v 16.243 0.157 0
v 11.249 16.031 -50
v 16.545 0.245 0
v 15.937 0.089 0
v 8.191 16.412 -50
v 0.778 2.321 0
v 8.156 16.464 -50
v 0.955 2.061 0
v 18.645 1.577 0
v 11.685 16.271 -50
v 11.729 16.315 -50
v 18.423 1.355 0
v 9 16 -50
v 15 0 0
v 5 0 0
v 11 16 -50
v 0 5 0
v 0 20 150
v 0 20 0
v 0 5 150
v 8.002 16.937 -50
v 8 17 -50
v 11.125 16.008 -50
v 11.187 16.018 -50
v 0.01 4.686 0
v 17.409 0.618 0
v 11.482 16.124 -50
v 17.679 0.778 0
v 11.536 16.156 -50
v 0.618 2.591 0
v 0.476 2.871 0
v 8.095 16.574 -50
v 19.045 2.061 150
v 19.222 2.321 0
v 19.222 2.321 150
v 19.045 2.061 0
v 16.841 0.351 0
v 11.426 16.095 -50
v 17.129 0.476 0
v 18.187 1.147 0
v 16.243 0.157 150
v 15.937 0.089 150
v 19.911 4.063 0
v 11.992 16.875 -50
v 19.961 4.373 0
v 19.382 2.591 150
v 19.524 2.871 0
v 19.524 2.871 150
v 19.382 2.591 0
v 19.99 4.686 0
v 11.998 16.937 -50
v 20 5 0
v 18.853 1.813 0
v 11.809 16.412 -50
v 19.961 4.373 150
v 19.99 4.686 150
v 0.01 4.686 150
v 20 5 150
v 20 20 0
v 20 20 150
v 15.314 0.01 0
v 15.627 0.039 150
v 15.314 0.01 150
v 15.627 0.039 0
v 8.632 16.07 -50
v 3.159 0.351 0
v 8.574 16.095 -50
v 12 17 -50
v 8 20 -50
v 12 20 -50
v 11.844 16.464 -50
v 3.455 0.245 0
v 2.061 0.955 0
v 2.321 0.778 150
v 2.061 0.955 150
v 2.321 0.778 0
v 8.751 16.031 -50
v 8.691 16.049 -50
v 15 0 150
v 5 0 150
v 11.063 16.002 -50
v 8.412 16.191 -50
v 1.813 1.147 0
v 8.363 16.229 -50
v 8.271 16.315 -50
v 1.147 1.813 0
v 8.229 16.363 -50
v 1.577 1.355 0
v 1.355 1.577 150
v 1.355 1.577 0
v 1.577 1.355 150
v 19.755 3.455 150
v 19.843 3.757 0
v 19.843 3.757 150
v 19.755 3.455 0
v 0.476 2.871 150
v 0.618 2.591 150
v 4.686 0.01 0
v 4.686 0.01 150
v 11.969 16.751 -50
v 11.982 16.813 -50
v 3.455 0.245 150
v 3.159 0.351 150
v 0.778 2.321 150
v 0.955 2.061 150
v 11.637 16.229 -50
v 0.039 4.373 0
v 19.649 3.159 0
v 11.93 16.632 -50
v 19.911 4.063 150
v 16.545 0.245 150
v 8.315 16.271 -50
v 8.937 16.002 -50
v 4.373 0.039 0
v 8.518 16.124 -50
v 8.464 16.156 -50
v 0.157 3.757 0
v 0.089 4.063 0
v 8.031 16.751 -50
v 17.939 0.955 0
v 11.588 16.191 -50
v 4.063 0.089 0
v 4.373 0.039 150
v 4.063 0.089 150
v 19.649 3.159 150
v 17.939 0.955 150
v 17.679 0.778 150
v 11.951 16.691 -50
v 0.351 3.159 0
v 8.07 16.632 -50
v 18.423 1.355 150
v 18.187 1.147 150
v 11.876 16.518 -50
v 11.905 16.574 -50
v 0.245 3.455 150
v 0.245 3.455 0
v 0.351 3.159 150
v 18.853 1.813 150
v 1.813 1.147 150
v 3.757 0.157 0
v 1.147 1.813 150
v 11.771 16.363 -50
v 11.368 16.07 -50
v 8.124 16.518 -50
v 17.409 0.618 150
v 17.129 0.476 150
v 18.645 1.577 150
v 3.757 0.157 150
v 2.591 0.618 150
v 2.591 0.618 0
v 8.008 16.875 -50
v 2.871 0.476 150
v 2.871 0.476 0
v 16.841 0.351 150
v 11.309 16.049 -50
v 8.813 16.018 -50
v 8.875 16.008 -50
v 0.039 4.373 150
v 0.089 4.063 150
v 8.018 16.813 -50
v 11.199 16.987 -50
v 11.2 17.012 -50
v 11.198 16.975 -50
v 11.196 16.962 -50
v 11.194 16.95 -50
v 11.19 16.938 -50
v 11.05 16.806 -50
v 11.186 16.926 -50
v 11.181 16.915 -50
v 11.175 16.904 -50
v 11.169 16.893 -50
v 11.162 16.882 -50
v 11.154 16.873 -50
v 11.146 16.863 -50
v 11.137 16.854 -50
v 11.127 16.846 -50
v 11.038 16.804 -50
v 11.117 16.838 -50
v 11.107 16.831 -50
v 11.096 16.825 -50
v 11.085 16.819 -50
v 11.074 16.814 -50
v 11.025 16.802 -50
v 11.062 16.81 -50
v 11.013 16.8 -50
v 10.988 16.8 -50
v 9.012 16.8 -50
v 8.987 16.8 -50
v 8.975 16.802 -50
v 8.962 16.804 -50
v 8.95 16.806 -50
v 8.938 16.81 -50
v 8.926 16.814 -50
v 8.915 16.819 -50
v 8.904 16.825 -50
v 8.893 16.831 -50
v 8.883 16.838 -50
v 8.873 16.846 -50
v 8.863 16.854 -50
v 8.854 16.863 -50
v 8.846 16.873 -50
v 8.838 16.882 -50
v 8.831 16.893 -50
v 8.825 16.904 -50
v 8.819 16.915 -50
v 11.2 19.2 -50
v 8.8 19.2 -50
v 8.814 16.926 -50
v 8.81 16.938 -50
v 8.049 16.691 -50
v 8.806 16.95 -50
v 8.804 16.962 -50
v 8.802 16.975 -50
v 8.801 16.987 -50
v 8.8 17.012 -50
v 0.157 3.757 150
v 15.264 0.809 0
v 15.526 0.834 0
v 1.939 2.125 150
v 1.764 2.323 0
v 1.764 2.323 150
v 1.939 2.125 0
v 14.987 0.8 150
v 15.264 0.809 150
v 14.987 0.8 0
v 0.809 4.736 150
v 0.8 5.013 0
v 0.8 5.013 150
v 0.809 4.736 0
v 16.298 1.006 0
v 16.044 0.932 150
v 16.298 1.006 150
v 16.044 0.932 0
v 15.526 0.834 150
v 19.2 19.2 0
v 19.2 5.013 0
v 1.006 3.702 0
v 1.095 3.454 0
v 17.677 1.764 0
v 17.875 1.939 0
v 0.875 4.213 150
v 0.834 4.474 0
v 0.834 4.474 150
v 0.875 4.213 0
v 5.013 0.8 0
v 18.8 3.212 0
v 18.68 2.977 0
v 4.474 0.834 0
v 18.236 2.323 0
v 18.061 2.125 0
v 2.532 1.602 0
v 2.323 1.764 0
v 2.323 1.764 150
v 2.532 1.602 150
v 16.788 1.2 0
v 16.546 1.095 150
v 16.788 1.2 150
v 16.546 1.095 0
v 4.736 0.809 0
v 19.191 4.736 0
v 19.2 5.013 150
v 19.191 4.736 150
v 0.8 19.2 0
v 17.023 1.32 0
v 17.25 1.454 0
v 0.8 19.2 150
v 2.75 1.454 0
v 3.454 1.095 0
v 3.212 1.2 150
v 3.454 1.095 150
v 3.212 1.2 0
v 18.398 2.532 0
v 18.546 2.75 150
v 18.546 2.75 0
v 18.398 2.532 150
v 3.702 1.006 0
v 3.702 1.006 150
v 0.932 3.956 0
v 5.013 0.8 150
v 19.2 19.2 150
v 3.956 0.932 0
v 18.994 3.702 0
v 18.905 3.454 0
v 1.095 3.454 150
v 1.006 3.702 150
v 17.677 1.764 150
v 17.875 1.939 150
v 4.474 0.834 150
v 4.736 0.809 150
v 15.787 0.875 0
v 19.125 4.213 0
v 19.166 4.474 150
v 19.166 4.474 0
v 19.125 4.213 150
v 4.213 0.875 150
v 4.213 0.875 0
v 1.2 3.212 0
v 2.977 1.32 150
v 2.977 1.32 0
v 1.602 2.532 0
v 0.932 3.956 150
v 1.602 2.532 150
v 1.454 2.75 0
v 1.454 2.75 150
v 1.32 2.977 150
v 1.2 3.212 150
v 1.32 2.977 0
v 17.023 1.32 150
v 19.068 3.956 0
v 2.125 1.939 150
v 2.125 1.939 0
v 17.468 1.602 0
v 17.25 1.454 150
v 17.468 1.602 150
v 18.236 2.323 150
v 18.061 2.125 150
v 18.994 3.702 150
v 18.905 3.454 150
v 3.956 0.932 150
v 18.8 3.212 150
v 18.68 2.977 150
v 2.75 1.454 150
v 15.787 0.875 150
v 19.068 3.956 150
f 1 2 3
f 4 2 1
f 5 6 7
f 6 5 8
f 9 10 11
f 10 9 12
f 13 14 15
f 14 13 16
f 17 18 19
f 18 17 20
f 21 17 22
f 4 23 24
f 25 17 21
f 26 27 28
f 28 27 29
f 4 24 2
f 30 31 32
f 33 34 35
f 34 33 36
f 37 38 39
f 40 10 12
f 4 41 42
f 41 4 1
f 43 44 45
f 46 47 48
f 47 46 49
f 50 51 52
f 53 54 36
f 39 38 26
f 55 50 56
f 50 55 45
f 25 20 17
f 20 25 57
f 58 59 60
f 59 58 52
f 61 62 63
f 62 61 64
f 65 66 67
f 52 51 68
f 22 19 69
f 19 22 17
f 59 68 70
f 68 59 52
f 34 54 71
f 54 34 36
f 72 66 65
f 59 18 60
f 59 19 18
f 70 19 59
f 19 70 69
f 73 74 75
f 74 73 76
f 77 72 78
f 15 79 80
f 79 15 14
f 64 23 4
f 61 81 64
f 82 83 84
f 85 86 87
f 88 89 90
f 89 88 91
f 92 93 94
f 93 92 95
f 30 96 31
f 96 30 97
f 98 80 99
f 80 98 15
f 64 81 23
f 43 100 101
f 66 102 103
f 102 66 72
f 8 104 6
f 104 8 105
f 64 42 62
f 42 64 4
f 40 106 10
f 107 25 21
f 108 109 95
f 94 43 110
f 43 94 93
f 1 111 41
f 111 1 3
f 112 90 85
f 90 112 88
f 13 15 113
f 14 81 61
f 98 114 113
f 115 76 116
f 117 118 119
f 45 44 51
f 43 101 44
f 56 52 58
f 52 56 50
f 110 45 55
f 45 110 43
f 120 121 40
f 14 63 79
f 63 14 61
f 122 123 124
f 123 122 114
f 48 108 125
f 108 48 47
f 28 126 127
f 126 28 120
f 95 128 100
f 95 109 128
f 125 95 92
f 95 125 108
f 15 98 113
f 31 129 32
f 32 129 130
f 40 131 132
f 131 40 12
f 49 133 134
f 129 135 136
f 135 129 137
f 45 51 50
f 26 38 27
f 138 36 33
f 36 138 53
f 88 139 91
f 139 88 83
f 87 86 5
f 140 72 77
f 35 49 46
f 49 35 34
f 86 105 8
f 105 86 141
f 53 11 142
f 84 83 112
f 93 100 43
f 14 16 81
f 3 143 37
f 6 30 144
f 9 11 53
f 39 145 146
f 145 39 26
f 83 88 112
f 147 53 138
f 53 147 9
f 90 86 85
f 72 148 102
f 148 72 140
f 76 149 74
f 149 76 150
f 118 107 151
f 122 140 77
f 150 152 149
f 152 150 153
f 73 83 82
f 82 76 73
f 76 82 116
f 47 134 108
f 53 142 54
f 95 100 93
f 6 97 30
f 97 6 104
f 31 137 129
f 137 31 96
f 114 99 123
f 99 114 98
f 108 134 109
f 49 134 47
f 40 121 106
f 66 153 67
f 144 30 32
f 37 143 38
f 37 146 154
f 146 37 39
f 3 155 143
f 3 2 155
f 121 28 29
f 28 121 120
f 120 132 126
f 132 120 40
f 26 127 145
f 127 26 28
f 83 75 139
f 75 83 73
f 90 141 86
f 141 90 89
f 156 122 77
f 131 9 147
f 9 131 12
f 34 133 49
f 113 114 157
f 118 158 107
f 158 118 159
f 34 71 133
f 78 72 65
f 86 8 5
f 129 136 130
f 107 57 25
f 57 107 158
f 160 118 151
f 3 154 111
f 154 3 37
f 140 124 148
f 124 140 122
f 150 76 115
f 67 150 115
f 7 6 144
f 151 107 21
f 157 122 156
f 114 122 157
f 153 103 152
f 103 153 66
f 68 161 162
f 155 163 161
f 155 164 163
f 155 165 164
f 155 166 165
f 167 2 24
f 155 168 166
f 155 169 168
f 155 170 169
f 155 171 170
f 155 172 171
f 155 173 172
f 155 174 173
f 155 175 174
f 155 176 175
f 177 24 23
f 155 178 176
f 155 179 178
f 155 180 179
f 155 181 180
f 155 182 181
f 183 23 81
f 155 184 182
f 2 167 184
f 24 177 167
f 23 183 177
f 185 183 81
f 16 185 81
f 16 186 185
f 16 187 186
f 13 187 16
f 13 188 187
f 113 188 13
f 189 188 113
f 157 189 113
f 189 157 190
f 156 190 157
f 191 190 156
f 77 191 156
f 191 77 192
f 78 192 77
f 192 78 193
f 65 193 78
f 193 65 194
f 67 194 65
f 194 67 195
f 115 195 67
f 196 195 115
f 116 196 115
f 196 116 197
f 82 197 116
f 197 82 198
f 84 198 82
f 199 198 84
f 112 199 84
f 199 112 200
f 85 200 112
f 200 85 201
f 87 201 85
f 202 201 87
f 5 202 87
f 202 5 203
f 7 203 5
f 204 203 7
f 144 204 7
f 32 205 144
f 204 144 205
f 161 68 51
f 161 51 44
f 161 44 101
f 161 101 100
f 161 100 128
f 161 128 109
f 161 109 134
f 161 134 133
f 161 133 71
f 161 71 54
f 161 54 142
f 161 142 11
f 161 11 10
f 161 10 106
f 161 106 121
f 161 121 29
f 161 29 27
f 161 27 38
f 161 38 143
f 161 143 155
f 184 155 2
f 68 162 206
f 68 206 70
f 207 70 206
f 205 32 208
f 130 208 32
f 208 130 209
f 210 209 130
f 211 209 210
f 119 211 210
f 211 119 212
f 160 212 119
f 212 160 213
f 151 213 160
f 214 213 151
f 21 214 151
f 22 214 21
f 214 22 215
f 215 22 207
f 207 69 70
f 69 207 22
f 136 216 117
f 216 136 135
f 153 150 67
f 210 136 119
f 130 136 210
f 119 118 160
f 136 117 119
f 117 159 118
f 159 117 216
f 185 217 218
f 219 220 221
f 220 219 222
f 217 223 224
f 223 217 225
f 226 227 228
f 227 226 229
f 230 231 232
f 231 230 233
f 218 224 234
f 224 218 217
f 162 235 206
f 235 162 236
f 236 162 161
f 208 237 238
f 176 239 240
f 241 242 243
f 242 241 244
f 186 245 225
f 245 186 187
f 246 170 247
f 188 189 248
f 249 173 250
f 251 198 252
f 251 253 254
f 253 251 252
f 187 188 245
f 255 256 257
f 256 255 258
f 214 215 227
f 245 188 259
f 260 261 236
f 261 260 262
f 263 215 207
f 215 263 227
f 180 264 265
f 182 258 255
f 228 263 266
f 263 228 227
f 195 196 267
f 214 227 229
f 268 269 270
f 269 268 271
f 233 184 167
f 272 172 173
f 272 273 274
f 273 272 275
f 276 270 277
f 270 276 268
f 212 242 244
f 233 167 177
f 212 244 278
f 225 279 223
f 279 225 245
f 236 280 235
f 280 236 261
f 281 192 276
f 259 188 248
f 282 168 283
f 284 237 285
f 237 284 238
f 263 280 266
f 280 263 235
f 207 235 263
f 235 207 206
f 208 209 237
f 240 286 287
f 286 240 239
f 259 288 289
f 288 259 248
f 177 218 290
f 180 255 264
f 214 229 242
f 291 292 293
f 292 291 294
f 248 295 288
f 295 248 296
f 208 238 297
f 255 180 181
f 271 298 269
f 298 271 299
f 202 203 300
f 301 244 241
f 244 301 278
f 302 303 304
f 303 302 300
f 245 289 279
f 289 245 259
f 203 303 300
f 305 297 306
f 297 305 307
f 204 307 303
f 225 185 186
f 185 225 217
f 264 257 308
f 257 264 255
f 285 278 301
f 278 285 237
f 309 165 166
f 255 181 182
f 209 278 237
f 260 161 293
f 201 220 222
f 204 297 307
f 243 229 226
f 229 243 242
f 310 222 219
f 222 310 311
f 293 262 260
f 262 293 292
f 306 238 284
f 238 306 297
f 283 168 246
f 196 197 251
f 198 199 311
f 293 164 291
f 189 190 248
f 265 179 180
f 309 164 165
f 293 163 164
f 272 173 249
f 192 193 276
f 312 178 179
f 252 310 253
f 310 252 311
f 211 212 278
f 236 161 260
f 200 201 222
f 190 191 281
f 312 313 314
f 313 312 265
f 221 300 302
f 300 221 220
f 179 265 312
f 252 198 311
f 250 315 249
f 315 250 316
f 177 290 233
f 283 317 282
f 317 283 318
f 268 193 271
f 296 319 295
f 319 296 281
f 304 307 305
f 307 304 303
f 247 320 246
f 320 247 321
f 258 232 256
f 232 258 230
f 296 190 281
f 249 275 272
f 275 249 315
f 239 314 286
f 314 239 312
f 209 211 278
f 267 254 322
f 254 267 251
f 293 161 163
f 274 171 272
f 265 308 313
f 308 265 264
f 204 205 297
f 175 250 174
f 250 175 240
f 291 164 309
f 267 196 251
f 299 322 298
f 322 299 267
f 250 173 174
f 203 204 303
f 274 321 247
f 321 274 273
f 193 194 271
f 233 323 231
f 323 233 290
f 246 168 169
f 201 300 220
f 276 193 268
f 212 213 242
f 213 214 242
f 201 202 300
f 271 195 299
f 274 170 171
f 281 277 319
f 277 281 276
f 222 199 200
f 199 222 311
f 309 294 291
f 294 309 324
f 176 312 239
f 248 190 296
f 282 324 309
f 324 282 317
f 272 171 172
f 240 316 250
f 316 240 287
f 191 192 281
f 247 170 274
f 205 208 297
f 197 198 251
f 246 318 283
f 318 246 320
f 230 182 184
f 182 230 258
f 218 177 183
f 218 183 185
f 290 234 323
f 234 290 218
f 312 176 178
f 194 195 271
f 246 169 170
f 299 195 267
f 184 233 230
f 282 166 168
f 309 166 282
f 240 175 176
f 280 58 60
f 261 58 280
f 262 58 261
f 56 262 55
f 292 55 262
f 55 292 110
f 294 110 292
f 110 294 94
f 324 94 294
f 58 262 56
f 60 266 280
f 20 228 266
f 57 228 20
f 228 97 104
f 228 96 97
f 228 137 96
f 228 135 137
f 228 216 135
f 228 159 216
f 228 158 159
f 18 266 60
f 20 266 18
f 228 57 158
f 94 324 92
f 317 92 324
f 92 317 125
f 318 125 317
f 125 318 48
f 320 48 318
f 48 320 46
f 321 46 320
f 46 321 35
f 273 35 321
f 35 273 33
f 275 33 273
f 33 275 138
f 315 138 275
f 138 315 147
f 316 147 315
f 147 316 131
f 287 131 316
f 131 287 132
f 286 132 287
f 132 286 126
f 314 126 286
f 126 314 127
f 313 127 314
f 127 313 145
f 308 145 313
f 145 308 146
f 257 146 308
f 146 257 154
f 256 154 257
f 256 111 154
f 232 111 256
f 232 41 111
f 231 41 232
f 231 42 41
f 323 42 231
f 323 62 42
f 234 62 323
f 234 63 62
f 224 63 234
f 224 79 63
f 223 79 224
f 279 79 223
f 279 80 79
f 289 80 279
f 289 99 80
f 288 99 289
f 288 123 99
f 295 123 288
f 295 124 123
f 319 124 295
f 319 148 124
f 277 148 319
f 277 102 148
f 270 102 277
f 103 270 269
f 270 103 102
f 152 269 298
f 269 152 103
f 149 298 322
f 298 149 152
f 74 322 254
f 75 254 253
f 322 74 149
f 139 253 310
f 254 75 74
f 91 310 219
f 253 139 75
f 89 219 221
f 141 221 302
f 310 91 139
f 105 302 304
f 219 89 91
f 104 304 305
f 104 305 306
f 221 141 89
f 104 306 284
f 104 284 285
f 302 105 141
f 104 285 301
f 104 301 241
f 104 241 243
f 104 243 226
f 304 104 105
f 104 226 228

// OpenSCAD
$fn = 100;
// Fudge factor
e = 0.001;

width = 20;
height = 20;
length = 150;
wallThickness = 0.8;

trailLength = 50;
trailingSize = 5*wallThickness;

module mainCrossSection(w,h){

	cornerRadius = w / 4;
	
	difference(){
		translate([cornerRadius,cornerRadius])
		offset(r=cornerRadius)
		square([w-2*cornerRadius,h-cornerRadius]);
		
		translate([-e,h])
		square([w+2*e,cornerRadius+e]);
	}
}


// Main fuselage
linear_extrude(length){
	difference(){
		mainCrossSection(width,height);
	
		offset(-wallThickness)
		mainCrossSection(width, height);
	}
}

// trailing section
difference()
{
	hull()
	{
		linear_extrude(e)
		mainCrossSection(width,height);
		
		translate([0,0,-trailLength])
		linear_extrude(e){
			translate([ (width-trailingSize)/2, height-trailingSize ])
			mainCrossSection(trailingSize,trailingSize);
		}
	}

	hull()
	{
		linear_extrude(2*e){
			offset(-wallThickness)
			mainCrossSection(width,height);
		}
		
		translate([0,0,-trailLength-e])
		linear_extrude(2*e){
			translate([ (width-trailingSize)/2, height-trailingSize ])
			offset(-wallThickness)
			mainCrossSection(trailingSize,trailingSize);
		}
	}
}
